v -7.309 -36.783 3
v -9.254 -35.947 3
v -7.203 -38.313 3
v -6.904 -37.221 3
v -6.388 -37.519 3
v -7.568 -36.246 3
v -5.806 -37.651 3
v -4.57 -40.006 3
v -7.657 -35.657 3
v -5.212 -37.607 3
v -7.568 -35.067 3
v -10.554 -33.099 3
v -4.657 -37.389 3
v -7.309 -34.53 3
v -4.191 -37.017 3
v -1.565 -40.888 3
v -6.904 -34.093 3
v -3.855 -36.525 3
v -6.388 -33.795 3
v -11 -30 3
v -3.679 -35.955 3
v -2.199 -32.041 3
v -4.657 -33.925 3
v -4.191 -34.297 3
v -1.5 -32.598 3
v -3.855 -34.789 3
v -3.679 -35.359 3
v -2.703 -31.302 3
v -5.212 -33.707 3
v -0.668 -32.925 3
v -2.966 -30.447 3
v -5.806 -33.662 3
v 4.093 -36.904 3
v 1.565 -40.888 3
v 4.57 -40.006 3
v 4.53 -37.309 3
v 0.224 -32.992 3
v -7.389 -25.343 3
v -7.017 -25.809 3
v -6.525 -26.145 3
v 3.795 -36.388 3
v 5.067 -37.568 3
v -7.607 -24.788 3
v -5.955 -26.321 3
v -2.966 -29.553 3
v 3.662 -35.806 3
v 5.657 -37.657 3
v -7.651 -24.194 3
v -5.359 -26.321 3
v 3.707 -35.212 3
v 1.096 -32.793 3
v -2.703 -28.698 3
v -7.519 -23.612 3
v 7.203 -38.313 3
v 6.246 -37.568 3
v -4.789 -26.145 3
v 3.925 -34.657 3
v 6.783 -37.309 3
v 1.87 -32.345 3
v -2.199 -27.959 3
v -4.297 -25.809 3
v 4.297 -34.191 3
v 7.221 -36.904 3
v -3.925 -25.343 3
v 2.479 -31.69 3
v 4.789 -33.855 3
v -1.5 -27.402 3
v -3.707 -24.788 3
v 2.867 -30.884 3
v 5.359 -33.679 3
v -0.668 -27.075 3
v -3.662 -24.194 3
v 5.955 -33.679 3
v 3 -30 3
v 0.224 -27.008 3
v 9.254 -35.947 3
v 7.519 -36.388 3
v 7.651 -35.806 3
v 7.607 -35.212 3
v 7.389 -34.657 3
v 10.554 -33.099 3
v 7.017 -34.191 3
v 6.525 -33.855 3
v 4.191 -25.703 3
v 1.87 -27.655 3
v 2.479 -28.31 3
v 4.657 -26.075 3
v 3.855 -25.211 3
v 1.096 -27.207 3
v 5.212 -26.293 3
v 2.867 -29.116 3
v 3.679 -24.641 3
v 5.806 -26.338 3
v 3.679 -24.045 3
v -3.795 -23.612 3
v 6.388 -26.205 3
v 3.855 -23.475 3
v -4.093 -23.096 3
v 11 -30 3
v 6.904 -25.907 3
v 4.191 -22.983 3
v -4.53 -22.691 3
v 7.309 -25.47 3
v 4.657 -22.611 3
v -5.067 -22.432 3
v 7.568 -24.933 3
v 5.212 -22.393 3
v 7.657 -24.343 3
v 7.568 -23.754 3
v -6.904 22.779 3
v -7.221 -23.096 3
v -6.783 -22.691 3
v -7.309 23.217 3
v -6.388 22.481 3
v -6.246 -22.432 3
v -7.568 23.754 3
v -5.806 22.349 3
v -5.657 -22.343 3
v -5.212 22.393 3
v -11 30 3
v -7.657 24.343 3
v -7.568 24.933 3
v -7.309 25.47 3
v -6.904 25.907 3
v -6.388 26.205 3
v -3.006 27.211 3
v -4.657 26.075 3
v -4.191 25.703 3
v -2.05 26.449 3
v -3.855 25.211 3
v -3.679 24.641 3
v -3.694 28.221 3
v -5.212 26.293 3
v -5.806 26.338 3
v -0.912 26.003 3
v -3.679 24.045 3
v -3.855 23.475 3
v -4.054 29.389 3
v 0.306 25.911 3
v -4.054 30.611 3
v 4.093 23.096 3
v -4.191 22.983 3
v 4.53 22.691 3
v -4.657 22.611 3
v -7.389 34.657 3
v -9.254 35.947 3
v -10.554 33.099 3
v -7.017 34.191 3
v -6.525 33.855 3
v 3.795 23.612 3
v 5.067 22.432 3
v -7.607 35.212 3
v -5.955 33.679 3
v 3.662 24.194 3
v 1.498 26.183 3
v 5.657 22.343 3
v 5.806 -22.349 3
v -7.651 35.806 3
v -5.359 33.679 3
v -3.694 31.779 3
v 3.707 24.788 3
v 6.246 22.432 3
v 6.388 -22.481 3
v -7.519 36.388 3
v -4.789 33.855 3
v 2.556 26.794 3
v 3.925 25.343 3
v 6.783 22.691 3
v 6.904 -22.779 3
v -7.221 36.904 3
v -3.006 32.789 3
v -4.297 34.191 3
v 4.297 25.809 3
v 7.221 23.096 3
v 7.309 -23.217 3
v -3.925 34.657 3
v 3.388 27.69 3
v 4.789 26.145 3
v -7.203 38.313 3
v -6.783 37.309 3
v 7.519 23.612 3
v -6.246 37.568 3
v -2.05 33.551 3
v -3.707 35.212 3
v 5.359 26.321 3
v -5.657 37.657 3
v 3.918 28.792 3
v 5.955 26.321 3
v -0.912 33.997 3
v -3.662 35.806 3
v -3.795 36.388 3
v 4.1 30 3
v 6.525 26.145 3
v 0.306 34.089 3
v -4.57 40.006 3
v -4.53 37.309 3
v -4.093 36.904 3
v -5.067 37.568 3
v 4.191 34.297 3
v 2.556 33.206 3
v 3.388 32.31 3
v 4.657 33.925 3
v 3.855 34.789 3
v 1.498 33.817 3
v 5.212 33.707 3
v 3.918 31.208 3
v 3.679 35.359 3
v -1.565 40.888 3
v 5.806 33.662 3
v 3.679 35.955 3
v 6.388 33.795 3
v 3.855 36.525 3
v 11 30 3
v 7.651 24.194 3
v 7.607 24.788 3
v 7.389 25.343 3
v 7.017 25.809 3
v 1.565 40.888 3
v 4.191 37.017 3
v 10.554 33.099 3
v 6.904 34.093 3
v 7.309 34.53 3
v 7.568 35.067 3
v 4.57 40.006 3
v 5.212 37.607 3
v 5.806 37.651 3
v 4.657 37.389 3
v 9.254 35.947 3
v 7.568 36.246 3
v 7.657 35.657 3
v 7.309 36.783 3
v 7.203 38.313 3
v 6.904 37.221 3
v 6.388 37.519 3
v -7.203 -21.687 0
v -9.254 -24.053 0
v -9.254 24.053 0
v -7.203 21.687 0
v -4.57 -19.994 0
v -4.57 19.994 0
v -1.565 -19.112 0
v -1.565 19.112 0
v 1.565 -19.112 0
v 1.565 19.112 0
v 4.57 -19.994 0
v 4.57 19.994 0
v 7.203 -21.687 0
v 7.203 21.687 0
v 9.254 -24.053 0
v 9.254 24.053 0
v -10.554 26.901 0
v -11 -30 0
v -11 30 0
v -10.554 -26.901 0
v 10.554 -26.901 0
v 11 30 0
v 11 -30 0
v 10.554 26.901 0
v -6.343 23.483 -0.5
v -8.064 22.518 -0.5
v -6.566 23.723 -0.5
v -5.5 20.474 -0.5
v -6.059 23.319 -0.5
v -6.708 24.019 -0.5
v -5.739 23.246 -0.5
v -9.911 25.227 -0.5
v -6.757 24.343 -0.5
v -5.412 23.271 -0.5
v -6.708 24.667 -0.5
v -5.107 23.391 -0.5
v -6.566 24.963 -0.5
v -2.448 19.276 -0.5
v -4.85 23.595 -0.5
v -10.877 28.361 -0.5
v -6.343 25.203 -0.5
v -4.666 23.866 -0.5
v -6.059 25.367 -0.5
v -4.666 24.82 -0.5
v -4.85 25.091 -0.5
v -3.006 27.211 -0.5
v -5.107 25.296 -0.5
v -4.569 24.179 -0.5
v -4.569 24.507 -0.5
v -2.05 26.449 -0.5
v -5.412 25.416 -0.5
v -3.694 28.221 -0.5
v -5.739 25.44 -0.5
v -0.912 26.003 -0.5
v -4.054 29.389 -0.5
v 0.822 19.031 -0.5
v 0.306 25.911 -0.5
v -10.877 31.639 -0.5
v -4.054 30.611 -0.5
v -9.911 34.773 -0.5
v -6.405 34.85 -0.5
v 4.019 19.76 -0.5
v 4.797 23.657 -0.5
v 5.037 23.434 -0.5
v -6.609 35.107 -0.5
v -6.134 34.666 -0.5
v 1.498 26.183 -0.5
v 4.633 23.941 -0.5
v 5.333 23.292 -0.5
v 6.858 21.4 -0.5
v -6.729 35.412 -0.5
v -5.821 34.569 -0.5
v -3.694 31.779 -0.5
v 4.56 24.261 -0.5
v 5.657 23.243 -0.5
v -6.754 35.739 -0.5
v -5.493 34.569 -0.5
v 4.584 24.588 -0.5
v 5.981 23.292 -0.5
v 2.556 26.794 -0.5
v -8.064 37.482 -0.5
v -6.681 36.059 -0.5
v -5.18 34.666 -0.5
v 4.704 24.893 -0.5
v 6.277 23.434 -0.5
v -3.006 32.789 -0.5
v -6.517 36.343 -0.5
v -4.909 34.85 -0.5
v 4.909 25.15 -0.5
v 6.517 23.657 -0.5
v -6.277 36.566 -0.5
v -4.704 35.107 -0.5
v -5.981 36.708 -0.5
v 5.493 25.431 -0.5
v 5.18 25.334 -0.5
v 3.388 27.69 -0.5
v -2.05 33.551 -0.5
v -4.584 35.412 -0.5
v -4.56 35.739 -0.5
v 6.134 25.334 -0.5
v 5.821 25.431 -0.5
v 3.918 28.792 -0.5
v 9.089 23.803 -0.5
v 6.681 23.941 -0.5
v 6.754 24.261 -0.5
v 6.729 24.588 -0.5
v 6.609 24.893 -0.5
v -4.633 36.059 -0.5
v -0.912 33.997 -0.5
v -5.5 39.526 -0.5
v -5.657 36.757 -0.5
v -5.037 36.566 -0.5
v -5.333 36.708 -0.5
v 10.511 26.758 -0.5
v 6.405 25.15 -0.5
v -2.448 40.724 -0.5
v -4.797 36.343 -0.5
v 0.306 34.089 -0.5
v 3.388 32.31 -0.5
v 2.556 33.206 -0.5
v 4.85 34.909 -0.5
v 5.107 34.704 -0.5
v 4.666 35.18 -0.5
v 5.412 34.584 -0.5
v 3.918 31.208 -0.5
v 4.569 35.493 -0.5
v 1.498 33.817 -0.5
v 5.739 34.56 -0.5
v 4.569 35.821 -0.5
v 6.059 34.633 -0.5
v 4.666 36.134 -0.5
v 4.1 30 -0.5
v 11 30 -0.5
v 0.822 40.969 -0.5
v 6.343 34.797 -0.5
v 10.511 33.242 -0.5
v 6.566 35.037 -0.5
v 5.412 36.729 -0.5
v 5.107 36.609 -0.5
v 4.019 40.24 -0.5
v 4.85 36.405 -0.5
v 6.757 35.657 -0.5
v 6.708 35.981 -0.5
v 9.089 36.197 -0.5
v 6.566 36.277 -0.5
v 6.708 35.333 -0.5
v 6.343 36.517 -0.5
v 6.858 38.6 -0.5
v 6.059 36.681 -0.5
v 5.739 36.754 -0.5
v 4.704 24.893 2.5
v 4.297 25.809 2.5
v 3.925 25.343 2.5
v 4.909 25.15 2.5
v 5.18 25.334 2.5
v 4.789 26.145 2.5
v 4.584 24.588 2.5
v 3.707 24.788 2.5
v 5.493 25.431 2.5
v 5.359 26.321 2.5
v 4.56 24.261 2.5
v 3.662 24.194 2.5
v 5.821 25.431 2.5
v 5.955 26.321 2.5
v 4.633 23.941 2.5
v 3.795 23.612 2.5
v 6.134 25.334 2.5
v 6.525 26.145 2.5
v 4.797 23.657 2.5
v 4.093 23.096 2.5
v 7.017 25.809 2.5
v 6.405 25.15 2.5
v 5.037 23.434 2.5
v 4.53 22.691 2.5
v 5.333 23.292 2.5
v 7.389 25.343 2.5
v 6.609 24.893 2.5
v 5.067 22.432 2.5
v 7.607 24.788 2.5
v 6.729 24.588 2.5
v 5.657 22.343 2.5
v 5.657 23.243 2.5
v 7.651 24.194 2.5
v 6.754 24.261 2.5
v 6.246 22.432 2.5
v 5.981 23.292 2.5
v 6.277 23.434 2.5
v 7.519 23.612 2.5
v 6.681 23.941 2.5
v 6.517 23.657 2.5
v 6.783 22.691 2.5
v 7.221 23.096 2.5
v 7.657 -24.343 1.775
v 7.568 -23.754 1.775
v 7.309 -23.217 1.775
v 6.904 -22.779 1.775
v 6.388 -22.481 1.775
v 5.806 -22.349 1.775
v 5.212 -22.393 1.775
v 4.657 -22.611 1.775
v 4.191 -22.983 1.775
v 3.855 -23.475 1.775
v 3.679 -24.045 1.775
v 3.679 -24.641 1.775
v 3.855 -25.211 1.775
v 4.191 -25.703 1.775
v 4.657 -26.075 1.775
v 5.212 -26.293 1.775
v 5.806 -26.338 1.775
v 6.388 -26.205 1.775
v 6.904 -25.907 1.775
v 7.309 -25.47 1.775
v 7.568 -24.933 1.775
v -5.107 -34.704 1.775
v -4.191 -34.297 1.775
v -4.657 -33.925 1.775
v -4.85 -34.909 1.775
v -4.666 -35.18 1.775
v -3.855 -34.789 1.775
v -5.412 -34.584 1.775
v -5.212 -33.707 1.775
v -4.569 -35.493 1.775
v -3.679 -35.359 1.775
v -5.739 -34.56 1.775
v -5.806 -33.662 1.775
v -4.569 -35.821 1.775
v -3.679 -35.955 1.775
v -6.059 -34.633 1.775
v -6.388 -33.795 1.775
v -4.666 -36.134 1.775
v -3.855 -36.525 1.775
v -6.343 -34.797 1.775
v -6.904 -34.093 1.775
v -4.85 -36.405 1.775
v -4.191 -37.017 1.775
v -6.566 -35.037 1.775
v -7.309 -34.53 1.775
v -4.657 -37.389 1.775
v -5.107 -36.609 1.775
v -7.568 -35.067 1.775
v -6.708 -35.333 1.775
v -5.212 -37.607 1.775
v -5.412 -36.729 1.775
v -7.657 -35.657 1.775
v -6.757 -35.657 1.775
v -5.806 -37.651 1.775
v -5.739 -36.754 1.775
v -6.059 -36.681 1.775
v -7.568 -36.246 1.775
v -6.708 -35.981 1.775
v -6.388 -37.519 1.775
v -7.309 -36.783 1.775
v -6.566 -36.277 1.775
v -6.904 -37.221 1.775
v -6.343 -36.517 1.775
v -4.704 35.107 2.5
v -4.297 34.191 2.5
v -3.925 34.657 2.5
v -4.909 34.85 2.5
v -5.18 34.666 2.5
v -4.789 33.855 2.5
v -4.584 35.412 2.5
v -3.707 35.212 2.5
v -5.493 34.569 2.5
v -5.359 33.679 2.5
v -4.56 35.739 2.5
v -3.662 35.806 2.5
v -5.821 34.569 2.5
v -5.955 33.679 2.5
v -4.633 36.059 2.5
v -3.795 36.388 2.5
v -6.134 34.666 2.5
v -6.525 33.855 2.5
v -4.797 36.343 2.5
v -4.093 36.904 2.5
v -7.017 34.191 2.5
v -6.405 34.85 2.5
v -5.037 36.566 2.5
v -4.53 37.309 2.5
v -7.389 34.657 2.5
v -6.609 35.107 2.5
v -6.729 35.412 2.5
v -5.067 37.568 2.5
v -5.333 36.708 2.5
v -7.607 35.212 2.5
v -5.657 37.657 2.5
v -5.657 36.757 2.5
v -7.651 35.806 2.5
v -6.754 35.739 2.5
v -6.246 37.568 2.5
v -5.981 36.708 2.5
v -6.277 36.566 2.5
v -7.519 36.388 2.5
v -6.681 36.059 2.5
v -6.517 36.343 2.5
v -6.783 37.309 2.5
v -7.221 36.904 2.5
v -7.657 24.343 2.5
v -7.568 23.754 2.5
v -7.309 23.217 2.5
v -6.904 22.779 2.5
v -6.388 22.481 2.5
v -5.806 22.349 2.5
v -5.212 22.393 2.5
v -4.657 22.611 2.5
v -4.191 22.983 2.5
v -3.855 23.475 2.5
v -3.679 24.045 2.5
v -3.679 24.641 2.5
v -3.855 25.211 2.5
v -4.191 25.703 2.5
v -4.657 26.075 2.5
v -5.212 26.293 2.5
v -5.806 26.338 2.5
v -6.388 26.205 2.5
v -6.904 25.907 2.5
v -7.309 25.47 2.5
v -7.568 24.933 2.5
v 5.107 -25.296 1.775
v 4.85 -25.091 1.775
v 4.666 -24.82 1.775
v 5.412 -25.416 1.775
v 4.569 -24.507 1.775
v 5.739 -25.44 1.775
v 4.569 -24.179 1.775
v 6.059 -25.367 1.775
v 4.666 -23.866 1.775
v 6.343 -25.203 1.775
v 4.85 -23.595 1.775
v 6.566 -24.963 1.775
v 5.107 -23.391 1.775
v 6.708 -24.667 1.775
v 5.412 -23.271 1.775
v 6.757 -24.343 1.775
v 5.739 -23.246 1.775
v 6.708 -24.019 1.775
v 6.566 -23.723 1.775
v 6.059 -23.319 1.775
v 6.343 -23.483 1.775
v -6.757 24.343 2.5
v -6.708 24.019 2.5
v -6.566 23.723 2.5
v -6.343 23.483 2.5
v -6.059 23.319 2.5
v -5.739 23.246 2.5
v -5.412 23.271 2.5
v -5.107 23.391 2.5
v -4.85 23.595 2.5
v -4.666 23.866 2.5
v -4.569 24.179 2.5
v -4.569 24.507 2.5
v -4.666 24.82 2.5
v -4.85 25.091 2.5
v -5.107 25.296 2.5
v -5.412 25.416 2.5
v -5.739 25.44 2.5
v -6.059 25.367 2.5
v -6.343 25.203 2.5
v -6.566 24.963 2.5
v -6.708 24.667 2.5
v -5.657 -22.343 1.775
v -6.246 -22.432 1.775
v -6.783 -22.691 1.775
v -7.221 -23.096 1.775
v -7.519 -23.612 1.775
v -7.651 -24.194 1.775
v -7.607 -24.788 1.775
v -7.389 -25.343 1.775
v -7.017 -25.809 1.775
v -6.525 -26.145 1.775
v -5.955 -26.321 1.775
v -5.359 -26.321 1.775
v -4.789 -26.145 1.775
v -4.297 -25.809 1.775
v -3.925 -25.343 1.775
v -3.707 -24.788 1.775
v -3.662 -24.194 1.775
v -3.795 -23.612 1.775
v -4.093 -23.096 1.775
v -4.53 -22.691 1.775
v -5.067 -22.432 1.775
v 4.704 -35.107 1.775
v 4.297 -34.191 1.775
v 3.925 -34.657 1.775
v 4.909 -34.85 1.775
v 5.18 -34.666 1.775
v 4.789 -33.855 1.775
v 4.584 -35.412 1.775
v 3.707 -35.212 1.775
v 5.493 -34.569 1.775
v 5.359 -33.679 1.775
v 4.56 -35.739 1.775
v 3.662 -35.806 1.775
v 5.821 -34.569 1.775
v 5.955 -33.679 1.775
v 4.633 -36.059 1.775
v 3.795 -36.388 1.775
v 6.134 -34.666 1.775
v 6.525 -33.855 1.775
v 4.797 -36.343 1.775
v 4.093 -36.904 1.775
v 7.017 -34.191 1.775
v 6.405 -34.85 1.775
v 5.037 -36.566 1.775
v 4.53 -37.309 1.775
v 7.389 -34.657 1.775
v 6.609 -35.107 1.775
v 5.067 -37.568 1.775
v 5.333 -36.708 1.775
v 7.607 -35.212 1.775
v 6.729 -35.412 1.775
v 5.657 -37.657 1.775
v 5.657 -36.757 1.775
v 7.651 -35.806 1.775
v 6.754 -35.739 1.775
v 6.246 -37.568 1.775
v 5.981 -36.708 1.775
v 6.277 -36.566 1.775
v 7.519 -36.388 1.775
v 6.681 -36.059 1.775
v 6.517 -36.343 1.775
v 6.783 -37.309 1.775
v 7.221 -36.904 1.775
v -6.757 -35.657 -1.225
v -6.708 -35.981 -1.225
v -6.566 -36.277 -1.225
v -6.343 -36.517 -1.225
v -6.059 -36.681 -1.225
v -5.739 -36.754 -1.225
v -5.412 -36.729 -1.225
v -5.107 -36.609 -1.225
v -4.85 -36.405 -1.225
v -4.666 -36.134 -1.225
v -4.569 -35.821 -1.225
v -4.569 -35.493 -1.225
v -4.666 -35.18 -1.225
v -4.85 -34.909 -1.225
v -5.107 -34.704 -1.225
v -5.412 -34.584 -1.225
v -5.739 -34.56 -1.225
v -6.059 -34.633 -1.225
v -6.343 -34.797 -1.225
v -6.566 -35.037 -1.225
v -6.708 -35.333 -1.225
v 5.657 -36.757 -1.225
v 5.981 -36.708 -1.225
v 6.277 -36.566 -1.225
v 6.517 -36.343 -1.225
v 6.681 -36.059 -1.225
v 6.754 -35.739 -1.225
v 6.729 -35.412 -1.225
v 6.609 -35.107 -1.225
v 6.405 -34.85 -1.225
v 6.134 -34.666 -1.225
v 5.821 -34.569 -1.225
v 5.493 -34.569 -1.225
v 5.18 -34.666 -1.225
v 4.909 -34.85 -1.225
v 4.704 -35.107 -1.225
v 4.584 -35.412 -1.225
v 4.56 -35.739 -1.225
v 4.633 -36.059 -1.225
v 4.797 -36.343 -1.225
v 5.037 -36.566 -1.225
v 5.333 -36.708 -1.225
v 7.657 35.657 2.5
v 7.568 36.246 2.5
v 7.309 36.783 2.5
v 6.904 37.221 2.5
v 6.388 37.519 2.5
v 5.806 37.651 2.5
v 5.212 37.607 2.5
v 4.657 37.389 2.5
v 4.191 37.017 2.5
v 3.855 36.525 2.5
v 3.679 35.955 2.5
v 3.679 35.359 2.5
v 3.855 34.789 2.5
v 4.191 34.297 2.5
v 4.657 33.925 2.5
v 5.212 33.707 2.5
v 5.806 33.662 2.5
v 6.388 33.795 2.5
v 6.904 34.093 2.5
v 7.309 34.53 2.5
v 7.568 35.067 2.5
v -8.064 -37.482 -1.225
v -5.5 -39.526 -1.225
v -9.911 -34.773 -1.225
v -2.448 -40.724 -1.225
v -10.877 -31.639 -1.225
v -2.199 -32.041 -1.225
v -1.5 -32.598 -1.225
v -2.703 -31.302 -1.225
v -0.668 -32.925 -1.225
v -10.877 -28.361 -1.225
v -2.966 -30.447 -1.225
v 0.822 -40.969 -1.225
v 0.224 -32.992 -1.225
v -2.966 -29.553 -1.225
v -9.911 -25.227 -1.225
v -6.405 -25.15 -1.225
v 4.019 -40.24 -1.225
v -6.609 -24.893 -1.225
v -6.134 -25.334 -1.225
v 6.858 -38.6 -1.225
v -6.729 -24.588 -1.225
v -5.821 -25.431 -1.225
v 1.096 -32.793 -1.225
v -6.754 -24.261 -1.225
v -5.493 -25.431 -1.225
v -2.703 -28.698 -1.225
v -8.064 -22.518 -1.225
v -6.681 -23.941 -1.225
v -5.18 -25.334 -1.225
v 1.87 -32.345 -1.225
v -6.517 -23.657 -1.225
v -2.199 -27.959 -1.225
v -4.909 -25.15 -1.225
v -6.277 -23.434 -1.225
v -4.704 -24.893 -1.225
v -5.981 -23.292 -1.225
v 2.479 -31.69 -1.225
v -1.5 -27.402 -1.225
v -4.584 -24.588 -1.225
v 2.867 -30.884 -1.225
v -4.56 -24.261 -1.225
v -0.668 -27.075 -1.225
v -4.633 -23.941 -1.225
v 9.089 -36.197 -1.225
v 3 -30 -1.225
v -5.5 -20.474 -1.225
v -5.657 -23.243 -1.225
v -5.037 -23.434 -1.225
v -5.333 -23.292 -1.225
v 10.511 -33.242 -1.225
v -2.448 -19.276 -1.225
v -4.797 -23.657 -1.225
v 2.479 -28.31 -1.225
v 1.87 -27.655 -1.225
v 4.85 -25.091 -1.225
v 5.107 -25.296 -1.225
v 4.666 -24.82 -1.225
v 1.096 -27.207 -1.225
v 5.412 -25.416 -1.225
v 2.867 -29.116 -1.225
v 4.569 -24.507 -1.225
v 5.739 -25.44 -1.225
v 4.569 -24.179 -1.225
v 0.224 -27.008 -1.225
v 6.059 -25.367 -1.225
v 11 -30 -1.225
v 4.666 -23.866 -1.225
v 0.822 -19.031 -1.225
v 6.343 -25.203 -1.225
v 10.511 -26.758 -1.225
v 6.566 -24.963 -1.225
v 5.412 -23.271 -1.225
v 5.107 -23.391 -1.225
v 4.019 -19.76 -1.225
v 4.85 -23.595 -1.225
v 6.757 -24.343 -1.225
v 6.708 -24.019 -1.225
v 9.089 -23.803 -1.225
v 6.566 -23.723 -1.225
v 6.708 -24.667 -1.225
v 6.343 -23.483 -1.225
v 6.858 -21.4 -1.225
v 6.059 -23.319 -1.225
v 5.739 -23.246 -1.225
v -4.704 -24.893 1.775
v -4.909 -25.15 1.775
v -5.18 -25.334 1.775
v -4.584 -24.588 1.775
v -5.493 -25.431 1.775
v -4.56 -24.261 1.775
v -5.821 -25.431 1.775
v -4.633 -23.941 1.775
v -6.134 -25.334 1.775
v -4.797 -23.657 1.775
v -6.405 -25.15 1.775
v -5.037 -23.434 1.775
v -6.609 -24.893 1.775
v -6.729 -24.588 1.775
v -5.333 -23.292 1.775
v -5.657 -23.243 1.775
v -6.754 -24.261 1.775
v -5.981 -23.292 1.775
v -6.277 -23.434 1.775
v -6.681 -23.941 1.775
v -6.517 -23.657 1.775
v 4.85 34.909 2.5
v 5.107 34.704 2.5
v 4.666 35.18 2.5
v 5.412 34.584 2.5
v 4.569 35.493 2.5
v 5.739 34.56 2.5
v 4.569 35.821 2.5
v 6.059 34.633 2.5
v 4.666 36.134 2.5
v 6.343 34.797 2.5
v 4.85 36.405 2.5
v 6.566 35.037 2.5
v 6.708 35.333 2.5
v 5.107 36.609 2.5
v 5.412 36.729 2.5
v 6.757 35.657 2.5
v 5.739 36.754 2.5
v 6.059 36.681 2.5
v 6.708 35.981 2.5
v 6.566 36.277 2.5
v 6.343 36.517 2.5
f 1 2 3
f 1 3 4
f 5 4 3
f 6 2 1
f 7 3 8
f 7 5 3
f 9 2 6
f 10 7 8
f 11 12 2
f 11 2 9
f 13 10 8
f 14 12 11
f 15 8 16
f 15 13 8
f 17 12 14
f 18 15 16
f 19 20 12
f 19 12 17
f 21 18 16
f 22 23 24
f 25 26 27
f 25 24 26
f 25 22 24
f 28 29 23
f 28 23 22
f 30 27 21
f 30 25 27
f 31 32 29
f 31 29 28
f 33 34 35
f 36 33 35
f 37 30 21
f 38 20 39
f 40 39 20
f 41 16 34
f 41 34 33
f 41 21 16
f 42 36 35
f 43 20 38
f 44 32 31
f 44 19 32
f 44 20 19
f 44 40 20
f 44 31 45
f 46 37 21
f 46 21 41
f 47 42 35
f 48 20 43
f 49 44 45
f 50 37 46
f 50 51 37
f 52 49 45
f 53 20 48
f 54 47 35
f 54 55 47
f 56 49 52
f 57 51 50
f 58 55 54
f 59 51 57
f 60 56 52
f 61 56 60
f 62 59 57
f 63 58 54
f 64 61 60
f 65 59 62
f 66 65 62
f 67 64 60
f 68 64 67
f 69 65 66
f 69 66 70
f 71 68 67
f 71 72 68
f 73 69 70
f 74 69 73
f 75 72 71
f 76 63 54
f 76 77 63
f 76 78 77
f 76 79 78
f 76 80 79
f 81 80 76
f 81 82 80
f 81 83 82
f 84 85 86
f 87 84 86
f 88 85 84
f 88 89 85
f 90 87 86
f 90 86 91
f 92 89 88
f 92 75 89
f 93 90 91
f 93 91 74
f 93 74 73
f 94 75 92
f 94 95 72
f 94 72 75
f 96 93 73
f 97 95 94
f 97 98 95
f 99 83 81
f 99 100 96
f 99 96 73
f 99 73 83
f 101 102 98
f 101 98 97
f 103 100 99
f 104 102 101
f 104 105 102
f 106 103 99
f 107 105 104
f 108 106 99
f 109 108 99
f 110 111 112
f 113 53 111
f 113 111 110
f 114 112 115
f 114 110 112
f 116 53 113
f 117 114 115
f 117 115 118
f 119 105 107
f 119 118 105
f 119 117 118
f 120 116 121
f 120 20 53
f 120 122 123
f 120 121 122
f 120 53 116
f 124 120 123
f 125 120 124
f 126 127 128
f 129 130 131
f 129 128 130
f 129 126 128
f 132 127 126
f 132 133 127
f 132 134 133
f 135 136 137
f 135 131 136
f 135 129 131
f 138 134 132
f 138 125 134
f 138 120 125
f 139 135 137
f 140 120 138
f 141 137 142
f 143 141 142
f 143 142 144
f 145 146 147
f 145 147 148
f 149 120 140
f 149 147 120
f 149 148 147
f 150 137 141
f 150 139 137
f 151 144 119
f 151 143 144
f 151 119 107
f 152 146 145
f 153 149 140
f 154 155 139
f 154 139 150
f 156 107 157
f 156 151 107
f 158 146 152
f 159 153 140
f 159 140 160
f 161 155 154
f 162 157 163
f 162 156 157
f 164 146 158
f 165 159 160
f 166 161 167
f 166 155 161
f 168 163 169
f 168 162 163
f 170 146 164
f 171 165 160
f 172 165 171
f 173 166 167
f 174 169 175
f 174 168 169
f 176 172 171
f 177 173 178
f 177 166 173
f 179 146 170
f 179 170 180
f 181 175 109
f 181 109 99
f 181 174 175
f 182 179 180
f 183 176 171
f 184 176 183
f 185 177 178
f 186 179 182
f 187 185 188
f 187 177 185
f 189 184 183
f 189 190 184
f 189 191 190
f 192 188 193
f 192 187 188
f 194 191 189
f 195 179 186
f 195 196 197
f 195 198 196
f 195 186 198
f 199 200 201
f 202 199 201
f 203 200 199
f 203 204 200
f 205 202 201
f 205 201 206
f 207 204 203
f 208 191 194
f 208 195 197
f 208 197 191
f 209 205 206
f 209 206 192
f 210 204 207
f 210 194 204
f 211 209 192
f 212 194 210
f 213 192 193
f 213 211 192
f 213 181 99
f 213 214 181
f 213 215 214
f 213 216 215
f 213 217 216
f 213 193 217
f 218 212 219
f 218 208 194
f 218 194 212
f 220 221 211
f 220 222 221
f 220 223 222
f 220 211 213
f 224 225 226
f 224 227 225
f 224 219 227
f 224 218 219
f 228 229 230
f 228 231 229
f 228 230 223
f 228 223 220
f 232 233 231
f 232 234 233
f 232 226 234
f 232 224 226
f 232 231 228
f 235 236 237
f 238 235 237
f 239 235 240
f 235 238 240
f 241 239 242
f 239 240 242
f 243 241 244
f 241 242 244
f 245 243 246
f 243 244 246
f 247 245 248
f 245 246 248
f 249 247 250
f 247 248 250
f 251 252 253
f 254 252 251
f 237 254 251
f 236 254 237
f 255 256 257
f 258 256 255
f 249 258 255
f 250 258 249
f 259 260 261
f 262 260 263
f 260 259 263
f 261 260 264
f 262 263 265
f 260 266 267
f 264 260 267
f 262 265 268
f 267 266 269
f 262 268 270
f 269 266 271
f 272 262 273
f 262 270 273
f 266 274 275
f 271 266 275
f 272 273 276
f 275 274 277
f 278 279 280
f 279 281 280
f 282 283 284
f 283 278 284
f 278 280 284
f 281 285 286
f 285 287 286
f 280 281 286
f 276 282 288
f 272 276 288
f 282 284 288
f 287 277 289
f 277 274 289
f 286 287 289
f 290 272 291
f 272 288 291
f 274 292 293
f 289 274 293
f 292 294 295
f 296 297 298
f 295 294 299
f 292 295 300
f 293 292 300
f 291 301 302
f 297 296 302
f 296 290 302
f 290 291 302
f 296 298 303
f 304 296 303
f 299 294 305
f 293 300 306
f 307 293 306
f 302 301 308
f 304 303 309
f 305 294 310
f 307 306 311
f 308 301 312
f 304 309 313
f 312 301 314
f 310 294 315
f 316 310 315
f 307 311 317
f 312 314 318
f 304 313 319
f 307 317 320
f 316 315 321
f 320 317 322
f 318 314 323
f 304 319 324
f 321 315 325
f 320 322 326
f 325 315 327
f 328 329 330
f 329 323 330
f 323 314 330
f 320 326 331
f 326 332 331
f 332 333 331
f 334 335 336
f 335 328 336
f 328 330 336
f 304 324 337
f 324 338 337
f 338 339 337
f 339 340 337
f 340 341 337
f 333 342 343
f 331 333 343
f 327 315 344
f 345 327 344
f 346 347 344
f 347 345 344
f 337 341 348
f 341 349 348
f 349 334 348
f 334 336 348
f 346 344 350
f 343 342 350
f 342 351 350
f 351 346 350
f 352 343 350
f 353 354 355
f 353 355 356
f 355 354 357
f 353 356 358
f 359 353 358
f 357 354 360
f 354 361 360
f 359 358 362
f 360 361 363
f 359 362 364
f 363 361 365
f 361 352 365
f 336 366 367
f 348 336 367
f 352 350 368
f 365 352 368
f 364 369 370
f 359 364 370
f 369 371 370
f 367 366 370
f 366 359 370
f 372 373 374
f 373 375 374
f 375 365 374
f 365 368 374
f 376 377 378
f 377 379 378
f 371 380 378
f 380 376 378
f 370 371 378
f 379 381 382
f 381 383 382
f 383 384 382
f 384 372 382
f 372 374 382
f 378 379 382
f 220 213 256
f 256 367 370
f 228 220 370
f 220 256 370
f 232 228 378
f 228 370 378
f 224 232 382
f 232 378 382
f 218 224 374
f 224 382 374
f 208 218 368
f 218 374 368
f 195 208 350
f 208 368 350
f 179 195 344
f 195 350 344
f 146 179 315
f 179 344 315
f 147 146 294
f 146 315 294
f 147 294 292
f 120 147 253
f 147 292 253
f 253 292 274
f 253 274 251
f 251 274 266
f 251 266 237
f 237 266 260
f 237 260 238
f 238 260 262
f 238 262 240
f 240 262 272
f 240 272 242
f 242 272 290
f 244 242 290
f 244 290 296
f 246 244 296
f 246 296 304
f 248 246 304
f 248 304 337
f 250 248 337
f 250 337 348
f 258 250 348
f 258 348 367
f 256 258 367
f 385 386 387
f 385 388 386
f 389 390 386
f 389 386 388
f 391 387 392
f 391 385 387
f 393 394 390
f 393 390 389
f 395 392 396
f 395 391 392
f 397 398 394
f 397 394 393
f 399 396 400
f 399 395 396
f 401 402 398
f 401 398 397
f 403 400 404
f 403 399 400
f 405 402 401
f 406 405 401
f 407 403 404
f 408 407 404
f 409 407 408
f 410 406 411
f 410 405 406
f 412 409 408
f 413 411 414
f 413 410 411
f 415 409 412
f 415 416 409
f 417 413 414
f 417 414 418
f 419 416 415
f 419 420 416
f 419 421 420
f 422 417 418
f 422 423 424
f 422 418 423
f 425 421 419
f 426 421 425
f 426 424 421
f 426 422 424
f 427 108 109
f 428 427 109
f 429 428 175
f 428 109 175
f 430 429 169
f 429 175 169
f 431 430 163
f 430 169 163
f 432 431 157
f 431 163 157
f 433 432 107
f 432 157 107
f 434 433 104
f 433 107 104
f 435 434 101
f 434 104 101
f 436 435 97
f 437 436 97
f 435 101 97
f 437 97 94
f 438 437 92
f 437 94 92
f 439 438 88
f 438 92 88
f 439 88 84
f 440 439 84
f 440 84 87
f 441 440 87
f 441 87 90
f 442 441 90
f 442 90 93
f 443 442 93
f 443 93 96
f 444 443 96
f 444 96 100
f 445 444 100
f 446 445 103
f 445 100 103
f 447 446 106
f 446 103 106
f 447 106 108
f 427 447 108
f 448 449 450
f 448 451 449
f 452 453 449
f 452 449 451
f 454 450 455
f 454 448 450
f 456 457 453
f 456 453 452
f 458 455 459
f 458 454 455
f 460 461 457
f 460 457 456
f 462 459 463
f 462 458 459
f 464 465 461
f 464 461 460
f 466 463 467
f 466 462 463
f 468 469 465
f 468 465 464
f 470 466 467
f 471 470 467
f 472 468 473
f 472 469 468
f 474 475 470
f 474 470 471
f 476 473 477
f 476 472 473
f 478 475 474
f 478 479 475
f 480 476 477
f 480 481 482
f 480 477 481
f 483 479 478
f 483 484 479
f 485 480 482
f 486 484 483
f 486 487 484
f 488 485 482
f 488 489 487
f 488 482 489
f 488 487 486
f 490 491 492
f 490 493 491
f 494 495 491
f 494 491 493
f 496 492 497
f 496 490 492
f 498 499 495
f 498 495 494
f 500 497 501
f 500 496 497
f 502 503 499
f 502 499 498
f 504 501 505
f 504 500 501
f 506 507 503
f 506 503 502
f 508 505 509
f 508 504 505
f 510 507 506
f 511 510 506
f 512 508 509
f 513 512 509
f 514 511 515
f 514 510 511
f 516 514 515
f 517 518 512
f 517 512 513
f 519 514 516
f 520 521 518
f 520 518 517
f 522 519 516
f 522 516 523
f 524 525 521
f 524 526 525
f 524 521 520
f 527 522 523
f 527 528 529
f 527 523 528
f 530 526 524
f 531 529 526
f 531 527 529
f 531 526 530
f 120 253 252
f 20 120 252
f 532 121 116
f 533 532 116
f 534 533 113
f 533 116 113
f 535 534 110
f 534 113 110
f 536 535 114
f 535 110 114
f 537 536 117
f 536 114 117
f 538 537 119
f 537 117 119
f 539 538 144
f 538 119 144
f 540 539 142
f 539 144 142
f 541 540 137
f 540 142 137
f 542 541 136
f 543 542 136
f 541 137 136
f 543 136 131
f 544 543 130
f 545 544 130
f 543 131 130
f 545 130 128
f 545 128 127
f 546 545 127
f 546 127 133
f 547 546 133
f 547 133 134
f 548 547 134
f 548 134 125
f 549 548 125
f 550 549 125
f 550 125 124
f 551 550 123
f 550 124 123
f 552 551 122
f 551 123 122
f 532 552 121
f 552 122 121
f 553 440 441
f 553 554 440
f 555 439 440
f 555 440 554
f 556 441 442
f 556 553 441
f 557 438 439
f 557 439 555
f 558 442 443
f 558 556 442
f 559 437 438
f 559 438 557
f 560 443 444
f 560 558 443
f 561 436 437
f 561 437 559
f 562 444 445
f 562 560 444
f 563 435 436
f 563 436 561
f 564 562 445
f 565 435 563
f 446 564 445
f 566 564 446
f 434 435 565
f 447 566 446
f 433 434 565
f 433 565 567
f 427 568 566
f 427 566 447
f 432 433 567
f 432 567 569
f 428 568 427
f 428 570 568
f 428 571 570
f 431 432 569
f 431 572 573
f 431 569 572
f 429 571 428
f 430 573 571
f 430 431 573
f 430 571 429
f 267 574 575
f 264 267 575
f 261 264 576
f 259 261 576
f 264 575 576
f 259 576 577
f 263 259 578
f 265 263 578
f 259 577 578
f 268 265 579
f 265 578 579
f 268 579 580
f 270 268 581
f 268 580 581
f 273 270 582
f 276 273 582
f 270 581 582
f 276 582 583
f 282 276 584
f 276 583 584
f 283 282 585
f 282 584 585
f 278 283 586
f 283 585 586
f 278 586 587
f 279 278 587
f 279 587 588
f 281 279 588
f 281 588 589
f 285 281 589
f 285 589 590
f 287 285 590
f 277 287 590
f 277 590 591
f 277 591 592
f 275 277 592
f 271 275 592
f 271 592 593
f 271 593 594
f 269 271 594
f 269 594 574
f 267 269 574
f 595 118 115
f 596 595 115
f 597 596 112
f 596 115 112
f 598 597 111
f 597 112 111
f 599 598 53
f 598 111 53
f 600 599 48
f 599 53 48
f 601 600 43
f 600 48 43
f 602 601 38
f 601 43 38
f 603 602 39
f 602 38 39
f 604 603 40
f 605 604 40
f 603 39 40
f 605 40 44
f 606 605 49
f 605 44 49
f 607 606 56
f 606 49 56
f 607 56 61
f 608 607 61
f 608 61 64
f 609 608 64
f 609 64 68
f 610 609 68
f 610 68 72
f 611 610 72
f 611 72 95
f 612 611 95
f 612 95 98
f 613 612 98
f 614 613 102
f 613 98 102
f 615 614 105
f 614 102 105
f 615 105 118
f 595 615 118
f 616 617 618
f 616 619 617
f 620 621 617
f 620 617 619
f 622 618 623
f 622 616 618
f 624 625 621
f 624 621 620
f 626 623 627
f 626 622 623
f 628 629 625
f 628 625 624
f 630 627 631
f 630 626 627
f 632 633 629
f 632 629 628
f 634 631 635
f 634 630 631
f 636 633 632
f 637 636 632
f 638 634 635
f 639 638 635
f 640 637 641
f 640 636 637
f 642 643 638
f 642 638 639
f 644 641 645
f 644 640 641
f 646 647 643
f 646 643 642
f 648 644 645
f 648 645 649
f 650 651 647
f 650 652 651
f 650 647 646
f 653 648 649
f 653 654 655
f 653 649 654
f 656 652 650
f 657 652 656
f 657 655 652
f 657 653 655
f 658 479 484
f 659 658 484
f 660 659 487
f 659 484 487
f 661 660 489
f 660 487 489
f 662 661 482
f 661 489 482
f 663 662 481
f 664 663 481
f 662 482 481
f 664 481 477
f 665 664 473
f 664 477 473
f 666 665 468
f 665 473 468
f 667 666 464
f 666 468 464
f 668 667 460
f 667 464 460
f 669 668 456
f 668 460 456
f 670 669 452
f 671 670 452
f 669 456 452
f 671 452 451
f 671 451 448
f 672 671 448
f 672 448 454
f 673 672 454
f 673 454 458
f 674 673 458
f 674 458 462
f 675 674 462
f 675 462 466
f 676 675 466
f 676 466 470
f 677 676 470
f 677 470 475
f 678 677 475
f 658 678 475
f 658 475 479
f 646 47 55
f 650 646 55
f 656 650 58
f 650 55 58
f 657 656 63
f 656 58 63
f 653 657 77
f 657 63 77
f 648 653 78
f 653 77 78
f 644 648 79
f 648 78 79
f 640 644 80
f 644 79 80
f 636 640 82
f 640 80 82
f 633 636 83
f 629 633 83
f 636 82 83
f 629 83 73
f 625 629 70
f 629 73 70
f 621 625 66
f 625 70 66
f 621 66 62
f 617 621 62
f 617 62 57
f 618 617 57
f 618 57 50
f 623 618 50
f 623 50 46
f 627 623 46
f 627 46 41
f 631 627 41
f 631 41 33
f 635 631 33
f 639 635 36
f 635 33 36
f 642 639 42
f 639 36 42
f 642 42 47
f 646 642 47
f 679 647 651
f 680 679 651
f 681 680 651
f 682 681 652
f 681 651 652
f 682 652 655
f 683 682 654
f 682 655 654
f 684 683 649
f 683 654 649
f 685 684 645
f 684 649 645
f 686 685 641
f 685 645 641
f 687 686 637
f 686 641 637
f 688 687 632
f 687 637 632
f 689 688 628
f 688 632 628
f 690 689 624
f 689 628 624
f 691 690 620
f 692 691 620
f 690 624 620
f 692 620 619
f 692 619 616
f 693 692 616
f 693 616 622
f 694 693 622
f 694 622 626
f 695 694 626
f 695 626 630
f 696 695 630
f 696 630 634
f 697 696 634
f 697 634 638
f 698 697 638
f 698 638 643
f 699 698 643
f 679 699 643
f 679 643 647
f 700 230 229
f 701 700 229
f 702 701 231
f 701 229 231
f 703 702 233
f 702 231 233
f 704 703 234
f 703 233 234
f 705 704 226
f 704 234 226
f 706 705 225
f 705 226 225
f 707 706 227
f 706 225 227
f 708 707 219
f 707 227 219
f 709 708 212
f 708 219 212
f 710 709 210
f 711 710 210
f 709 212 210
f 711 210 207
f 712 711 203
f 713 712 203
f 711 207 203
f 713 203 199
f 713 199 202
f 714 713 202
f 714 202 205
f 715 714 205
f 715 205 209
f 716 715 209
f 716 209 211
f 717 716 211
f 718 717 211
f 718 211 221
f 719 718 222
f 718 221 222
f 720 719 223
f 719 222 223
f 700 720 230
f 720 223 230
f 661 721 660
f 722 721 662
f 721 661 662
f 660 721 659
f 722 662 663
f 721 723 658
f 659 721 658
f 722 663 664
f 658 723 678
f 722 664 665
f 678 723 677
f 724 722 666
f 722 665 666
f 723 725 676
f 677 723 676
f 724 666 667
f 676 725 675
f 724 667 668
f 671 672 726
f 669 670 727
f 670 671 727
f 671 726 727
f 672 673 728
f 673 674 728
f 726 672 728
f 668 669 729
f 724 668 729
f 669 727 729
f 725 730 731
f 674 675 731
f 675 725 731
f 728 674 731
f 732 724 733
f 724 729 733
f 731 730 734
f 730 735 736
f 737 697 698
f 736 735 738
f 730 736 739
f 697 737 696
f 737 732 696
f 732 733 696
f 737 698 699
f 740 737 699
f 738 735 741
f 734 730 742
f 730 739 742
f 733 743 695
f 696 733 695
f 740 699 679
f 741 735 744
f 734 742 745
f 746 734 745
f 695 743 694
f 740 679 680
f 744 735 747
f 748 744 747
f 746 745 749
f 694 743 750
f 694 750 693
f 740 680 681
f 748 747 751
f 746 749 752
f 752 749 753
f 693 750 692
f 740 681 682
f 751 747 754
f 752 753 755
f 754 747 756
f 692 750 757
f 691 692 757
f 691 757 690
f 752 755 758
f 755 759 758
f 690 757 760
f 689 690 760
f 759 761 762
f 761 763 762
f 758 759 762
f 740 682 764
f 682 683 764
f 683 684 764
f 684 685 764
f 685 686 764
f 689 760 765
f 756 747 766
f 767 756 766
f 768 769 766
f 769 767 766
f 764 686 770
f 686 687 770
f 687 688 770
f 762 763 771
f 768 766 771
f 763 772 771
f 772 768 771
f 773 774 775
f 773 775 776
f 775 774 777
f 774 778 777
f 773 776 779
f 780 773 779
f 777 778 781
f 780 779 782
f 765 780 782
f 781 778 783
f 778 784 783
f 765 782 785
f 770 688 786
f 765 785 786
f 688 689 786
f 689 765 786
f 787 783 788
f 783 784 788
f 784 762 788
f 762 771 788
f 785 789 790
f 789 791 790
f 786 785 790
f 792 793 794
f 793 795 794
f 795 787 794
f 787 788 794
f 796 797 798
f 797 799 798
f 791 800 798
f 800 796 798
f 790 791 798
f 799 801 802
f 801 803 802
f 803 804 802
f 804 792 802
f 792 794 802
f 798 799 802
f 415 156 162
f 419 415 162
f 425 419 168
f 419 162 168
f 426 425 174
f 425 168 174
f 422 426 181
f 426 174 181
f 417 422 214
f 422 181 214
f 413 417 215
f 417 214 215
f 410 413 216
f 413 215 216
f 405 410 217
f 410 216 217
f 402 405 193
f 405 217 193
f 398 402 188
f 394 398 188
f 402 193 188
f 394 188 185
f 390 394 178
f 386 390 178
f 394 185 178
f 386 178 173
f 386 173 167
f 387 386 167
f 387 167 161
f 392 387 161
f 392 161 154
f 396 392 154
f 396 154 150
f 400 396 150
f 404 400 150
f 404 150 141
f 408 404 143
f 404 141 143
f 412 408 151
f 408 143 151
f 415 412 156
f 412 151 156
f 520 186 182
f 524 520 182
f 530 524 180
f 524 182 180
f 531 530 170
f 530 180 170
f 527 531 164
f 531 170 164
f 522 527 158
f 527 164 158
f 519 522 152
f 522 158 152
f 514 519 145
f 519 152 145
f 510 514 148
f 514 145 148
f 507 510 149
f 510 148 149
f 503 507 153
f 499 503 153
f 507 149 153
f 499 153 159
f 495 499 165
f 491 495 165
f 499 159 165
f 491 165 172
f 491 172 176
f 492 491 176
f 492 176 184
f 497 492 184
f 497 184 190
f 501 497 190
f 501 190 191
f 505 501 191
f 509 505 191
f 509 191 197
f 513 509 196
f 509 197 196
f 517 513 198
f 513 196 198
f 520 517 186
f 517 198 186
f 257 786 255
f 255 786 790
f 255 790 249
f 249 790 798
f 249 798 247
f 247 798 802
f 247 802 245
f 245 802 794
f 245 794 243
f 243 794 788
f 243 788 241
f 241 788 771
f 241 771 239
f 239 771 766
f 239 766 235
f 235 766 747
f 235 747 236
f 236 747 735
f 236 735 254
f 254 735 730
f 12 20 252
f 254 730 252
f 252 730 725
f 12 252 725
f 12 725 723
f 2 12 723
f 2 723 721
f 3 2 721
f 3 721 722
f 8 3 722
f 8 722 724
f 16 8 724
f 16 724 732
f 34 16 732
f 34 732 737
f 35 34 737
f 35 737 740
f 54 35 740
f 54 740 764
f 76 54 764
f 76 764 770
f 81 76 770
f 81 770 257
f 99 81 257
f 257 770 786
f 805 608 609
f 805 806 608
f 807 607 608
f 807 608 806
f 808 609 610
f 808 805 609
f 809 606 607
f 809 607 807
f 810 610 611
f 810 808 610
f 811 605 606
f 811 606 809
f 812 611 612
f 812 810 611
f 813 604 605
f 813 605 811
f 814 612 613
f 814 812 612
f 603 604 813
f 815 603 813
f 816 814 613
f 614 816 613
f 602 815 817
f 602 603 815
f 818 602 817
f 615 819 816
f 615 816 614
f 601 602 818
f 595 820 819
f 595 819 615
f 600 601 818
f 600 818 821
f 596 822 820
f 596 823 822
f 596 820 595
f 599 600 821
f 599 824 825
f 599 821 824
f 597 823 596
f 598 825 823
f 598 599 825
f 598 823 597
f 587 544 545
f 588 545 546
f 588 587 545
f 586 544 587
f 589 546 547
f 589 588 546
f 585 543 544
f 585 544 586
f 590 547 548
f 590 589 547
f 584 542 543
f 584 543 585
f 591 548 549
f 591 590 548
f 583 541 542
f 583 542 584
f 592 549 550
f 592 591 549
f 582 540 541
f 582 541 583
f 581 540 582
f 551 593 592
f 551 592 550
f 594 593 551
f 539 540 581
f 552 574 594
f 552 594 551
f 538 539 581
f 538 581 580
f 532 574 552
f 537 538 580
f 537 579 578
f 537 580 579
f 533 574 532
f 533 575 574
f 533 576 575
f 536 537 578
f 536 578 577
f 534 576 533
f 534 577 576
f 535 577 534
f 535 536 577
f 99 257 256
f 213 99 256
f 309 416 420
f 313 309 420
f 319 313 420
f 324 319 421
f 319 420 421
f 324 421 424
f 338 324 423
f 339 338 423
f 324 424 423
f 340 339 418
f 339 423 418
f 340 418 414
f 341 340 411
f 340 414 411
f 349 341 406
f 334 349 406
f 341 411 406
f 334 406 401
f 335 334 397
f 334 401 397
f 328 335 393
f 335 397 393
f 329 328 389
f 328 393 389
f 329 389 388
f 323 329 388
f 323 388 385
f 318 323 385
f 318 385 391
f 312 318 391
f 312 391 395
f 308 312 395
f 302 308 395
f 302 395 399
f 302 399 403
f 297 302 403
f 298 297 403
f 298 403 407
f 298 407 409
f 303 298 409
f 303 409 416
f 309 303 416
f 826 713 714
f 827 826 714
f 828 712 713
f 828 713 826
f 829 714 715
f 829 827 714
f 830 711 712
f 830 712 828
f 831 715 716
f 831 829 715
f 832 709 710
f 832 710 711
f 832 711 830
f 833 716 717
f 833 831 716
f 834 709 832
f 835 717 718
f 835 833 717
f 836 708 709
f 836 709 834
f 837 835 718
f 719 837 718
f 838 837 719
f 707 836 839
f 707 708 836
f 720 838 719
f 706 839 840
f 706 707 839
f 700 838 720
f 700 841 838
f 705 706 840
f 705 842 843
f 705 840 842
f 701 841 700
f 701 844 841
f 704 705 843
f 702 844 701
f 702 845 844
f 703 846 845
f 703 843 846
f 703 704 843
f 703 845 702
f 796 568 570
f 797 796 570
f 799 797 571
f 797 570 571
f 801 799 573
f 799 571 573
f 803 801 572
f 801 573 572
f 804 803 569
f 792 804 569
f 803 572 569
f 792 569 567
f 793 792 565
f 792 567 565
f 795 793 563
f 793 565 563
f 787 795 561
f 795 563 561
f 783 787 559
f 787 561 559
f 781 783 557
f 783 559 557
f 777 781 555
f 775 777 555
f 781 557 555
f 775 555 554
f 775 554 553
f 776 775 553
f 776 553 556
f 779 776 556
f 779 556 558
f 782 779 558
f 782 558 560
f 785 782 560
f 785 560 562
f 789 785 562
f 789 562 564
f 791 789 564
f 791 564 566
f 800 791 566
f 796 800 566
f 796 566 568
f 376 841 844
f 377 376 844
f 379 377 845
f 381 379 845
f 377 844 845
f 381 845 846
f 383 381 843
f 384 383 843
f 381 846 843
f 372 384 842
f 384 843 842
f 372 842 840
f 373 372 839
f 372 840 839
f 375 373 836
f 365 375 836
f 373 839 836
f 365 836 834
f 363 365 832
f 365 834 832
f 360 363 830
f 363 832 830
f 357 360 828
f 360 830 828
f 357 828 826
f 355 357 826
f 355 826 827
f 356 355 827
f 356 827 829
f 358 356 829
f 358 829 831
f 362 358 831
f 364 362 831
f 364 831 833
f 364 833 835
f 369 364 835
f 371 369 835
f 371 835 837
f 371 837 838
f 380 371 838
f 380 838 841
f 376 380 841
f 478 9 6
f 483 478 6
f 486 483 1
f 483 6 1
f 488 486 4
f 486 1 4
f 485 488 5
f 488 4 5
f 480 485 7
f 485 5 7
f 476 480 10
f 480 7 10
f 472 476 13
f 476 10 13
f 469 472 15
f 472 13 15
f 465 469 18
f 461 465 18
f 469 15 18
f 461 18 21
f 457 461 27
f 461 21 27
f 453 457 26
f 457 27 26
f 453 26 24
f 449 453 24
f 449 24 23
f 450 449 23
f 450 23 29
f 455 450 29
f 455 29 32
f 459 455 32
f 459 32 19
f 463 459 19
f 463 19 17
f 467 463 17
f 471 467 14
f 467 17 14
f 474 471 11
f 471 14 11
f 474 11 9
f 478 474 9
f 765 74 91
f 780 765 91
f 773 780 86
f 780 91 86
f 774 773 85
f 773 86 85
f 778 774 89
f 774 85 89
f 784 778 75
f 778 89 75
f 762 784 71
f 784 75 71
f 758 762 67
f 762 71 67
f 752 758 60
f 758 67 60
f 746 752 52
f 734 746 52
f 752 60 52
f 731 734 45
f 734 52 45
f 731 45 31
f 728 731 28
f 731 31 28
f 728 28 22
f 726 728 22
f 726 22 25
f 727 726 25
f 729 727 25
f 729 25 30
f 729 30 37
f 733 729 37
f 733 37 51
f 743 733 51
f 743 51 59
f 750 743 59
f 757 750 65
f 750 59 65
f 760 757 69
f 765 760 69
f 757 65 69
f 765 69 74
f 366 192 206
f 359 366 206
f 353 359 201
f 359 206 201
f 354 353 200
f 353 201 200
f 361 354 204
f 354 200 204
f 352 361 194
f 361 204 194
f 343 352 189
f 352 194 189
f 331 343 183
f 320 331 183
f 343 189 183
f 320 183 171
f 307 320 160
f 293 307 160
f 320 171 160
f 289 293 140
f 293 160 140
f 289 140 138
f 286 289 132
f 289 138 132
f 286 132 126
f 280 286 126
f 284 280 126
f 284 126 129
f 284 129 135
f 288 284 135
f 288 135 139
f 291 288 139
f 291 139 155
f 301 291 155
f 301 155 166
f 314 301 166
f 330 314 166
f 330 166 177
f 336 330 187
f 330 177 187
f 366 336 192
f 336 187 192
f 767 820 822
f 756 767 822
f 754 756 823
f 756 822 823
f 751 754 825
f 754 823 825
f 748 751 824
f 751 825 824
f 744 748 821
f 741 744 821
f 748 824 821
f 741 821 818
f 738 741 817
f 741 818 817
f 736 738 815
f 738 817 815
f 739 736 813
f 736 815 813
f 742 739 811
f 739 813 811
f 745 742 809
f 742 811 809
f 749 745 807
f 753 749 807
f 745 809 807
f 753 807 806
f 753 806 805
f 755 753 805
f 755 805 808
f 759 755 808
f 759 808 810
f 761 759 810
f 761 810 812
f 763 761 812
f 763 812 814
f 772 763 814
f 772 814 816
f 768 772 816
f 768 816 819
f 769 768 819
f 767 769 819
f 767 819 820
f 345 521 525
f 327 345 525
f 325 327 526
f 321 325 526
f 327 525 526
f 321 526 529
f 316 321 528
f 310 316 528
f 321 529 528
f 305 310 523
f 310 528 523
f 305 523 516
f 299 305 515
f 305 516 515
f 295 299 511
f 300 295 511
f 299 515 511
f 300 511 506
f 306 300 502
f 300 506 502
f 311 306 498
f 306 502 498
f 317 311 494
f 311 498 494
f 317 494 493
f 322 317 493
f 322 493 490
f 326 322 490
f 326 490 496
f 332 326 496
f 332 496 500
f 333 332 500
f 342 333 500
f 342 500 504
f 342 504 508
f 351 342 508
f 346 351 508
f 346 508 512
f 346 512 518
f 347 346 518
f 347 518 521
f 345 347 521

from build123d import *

# Parameters (mm, degrees)
BOSS_EXTRUDE1_DEPTH = 3
BOSS_EXTRUDE2_START = -0.5
SKETCH1_3_R         = 11
BOSS_EXTRUDE2_DEPTH = 0.5
SKETCH2_R           = 4.1
SKETCH2_R_2         = 1.1
CUT_EXTRUDE1_DEPTH  = 3.5
SKETCH2_3_R         = 2
CUT_EXTRUDE2_DEPTH  = 0.5
CIRPATTERN2_COUNT   = 4
BOSS_EXTRUDE3_START = -1.225
SKETCH1_5_R         = 11
BOSS_EXTRUDE3_DEPTH = 1.225
SKETCH3_R           = 3
SKETCH3_R_2         = 1.1
CUT_EXTRUDE3_DEPTH  = 4.225
SKETCH3_3_R         = 2
CUT_EXTRUDE4_DEPTH  = 1.225
CIRPATTERN3_COUNT   = 4


with BuildPart() as part:
    # Sketch1 → Boss-Extrude1 (new body)
    with BuildSketch(Plane.XY):
        with BuildLine():
            Line((-11, 30), (-11, -30))
            ThreePointArc((-11, -30), (0, -41), (11, -30))
            Line((11, -30), (11, 30))
            ThreePointArc((11, 30), (0, 41), (-11, 30))
        make_face()
    extrude(amount=BOSS_EXTRUDE1_DEPTH)

    # Sketch1<3> → Boss-Extrude2 (add)
    with BuildSketch(Plane.XY.offset(BOSS_EXTRUDE2_START)):
        with Locations((0, 30)):
            Circle(SKETCH1_3_R)
    extrude(amount=BOSS_EXTRUDE2_DEPTH)

    # Sketch2 → Cut-Extrude1 (cut)
    with BuildSketch(Plane.XY.offset(3)):
        with Locations((0, 30)):
            Circle(SKETCH2_R)
        with Locations((5.656854249, 35.656854249)):
            Circle(SKETCH2_R_2)
    cut_extrude1 = extrude(amount=-CUT_EXTRUDE1_DEPTH, mode=Mode.SUBTRACT)

    # Sketch2<3> → Cut-Extrude2 (cut)
    with BuildSketch(Plane.XY.offset(3)):
        with Locations((5.656854249, 35.656854249)):
            Circle(SKETCH2_3_R)
    cut_extrude2 = extrude(amount=-CUT_EXTRUDE2_DEPTH, mode=Mode.SUBTRACT)

    # CirPattern2: Cut-Extrude1, Cut-Extrude2 ×4 about axis
    cirpattern2_axis = Axis((0, 30, 0), (0, 0, 1))
    add([cut_extrude1.rotate(cirpattern2_axis, i * 360 / CIRPATTERN2_COUNT) for i in range(1, CIRPATTERN2_COUNT)], mode=Mode.SUBTRACT)
    add([cut_extrude2.rotate(cirpattern2_axis, i * 360 / CIRPATTERN2_COUNT) for i in range(1, CIRPATTERN2_COUNT)], mode=Mode.SUBTRACT)

    # Sketch1<5> → Boss-Extrude3 (add)
    with BuildSketch(Plane.XY.offset(BOSS_EXTRUDE3_START)):
        with Locations((0, -30)):
            Circle(SKETCH1_5_R)
    extrude(amount=BOSS_EXTRUDE3_DEPTH)

    # Sketch3 → Cut-Extrude3 (cut)
    with BuildSketch(Plane.XY.offset(3)):
        with Locations((0, -30)):
            Circle(SKETCH3_R)
        with Locations((5.656854249, -24.343145751)):
            Circle(SKETCH3_R_2)
    cut_extrude3 = extrude(amount=-CUT_EXTRUDE3_DEPTH, mode=Mode.SUBTRACT)

    # Sketch3<3> → Cut-Extrude4 (cut)
    with BuildSketch(Plane.XY.offset(3)):
        with Locations((5.656854249, -24.343145751)):
            Circle(SKETCH3_3_R)
    cut_extrude4 = extrude(amount=-CUT_EXTRUDE4_DEPTH, mode=Mode.SUBTRACT)

    # CirPattern3: Cut-Extrude3, Cut-Extrude4 ×4 about axis
    cirpattern3_axis = Axis((0, -30, 0), (0, 0, 1))
    add([cut_extrude3.rotate(cirpattern3_axis, i * 360 / CIRPATTERN3_COUNT) for i in range(1, CIRPATTERN3_COUNT)], mode=Mode.SUBTRACT)
    add([cut_extrude4.rotate(cirpattern3_axis, i * 360 / CIRPATTERN3_COUNT) for i in range(1, CIRPATTERN3_COUNT)], mode=Mode.SUBTRACT)


solid = part.part
